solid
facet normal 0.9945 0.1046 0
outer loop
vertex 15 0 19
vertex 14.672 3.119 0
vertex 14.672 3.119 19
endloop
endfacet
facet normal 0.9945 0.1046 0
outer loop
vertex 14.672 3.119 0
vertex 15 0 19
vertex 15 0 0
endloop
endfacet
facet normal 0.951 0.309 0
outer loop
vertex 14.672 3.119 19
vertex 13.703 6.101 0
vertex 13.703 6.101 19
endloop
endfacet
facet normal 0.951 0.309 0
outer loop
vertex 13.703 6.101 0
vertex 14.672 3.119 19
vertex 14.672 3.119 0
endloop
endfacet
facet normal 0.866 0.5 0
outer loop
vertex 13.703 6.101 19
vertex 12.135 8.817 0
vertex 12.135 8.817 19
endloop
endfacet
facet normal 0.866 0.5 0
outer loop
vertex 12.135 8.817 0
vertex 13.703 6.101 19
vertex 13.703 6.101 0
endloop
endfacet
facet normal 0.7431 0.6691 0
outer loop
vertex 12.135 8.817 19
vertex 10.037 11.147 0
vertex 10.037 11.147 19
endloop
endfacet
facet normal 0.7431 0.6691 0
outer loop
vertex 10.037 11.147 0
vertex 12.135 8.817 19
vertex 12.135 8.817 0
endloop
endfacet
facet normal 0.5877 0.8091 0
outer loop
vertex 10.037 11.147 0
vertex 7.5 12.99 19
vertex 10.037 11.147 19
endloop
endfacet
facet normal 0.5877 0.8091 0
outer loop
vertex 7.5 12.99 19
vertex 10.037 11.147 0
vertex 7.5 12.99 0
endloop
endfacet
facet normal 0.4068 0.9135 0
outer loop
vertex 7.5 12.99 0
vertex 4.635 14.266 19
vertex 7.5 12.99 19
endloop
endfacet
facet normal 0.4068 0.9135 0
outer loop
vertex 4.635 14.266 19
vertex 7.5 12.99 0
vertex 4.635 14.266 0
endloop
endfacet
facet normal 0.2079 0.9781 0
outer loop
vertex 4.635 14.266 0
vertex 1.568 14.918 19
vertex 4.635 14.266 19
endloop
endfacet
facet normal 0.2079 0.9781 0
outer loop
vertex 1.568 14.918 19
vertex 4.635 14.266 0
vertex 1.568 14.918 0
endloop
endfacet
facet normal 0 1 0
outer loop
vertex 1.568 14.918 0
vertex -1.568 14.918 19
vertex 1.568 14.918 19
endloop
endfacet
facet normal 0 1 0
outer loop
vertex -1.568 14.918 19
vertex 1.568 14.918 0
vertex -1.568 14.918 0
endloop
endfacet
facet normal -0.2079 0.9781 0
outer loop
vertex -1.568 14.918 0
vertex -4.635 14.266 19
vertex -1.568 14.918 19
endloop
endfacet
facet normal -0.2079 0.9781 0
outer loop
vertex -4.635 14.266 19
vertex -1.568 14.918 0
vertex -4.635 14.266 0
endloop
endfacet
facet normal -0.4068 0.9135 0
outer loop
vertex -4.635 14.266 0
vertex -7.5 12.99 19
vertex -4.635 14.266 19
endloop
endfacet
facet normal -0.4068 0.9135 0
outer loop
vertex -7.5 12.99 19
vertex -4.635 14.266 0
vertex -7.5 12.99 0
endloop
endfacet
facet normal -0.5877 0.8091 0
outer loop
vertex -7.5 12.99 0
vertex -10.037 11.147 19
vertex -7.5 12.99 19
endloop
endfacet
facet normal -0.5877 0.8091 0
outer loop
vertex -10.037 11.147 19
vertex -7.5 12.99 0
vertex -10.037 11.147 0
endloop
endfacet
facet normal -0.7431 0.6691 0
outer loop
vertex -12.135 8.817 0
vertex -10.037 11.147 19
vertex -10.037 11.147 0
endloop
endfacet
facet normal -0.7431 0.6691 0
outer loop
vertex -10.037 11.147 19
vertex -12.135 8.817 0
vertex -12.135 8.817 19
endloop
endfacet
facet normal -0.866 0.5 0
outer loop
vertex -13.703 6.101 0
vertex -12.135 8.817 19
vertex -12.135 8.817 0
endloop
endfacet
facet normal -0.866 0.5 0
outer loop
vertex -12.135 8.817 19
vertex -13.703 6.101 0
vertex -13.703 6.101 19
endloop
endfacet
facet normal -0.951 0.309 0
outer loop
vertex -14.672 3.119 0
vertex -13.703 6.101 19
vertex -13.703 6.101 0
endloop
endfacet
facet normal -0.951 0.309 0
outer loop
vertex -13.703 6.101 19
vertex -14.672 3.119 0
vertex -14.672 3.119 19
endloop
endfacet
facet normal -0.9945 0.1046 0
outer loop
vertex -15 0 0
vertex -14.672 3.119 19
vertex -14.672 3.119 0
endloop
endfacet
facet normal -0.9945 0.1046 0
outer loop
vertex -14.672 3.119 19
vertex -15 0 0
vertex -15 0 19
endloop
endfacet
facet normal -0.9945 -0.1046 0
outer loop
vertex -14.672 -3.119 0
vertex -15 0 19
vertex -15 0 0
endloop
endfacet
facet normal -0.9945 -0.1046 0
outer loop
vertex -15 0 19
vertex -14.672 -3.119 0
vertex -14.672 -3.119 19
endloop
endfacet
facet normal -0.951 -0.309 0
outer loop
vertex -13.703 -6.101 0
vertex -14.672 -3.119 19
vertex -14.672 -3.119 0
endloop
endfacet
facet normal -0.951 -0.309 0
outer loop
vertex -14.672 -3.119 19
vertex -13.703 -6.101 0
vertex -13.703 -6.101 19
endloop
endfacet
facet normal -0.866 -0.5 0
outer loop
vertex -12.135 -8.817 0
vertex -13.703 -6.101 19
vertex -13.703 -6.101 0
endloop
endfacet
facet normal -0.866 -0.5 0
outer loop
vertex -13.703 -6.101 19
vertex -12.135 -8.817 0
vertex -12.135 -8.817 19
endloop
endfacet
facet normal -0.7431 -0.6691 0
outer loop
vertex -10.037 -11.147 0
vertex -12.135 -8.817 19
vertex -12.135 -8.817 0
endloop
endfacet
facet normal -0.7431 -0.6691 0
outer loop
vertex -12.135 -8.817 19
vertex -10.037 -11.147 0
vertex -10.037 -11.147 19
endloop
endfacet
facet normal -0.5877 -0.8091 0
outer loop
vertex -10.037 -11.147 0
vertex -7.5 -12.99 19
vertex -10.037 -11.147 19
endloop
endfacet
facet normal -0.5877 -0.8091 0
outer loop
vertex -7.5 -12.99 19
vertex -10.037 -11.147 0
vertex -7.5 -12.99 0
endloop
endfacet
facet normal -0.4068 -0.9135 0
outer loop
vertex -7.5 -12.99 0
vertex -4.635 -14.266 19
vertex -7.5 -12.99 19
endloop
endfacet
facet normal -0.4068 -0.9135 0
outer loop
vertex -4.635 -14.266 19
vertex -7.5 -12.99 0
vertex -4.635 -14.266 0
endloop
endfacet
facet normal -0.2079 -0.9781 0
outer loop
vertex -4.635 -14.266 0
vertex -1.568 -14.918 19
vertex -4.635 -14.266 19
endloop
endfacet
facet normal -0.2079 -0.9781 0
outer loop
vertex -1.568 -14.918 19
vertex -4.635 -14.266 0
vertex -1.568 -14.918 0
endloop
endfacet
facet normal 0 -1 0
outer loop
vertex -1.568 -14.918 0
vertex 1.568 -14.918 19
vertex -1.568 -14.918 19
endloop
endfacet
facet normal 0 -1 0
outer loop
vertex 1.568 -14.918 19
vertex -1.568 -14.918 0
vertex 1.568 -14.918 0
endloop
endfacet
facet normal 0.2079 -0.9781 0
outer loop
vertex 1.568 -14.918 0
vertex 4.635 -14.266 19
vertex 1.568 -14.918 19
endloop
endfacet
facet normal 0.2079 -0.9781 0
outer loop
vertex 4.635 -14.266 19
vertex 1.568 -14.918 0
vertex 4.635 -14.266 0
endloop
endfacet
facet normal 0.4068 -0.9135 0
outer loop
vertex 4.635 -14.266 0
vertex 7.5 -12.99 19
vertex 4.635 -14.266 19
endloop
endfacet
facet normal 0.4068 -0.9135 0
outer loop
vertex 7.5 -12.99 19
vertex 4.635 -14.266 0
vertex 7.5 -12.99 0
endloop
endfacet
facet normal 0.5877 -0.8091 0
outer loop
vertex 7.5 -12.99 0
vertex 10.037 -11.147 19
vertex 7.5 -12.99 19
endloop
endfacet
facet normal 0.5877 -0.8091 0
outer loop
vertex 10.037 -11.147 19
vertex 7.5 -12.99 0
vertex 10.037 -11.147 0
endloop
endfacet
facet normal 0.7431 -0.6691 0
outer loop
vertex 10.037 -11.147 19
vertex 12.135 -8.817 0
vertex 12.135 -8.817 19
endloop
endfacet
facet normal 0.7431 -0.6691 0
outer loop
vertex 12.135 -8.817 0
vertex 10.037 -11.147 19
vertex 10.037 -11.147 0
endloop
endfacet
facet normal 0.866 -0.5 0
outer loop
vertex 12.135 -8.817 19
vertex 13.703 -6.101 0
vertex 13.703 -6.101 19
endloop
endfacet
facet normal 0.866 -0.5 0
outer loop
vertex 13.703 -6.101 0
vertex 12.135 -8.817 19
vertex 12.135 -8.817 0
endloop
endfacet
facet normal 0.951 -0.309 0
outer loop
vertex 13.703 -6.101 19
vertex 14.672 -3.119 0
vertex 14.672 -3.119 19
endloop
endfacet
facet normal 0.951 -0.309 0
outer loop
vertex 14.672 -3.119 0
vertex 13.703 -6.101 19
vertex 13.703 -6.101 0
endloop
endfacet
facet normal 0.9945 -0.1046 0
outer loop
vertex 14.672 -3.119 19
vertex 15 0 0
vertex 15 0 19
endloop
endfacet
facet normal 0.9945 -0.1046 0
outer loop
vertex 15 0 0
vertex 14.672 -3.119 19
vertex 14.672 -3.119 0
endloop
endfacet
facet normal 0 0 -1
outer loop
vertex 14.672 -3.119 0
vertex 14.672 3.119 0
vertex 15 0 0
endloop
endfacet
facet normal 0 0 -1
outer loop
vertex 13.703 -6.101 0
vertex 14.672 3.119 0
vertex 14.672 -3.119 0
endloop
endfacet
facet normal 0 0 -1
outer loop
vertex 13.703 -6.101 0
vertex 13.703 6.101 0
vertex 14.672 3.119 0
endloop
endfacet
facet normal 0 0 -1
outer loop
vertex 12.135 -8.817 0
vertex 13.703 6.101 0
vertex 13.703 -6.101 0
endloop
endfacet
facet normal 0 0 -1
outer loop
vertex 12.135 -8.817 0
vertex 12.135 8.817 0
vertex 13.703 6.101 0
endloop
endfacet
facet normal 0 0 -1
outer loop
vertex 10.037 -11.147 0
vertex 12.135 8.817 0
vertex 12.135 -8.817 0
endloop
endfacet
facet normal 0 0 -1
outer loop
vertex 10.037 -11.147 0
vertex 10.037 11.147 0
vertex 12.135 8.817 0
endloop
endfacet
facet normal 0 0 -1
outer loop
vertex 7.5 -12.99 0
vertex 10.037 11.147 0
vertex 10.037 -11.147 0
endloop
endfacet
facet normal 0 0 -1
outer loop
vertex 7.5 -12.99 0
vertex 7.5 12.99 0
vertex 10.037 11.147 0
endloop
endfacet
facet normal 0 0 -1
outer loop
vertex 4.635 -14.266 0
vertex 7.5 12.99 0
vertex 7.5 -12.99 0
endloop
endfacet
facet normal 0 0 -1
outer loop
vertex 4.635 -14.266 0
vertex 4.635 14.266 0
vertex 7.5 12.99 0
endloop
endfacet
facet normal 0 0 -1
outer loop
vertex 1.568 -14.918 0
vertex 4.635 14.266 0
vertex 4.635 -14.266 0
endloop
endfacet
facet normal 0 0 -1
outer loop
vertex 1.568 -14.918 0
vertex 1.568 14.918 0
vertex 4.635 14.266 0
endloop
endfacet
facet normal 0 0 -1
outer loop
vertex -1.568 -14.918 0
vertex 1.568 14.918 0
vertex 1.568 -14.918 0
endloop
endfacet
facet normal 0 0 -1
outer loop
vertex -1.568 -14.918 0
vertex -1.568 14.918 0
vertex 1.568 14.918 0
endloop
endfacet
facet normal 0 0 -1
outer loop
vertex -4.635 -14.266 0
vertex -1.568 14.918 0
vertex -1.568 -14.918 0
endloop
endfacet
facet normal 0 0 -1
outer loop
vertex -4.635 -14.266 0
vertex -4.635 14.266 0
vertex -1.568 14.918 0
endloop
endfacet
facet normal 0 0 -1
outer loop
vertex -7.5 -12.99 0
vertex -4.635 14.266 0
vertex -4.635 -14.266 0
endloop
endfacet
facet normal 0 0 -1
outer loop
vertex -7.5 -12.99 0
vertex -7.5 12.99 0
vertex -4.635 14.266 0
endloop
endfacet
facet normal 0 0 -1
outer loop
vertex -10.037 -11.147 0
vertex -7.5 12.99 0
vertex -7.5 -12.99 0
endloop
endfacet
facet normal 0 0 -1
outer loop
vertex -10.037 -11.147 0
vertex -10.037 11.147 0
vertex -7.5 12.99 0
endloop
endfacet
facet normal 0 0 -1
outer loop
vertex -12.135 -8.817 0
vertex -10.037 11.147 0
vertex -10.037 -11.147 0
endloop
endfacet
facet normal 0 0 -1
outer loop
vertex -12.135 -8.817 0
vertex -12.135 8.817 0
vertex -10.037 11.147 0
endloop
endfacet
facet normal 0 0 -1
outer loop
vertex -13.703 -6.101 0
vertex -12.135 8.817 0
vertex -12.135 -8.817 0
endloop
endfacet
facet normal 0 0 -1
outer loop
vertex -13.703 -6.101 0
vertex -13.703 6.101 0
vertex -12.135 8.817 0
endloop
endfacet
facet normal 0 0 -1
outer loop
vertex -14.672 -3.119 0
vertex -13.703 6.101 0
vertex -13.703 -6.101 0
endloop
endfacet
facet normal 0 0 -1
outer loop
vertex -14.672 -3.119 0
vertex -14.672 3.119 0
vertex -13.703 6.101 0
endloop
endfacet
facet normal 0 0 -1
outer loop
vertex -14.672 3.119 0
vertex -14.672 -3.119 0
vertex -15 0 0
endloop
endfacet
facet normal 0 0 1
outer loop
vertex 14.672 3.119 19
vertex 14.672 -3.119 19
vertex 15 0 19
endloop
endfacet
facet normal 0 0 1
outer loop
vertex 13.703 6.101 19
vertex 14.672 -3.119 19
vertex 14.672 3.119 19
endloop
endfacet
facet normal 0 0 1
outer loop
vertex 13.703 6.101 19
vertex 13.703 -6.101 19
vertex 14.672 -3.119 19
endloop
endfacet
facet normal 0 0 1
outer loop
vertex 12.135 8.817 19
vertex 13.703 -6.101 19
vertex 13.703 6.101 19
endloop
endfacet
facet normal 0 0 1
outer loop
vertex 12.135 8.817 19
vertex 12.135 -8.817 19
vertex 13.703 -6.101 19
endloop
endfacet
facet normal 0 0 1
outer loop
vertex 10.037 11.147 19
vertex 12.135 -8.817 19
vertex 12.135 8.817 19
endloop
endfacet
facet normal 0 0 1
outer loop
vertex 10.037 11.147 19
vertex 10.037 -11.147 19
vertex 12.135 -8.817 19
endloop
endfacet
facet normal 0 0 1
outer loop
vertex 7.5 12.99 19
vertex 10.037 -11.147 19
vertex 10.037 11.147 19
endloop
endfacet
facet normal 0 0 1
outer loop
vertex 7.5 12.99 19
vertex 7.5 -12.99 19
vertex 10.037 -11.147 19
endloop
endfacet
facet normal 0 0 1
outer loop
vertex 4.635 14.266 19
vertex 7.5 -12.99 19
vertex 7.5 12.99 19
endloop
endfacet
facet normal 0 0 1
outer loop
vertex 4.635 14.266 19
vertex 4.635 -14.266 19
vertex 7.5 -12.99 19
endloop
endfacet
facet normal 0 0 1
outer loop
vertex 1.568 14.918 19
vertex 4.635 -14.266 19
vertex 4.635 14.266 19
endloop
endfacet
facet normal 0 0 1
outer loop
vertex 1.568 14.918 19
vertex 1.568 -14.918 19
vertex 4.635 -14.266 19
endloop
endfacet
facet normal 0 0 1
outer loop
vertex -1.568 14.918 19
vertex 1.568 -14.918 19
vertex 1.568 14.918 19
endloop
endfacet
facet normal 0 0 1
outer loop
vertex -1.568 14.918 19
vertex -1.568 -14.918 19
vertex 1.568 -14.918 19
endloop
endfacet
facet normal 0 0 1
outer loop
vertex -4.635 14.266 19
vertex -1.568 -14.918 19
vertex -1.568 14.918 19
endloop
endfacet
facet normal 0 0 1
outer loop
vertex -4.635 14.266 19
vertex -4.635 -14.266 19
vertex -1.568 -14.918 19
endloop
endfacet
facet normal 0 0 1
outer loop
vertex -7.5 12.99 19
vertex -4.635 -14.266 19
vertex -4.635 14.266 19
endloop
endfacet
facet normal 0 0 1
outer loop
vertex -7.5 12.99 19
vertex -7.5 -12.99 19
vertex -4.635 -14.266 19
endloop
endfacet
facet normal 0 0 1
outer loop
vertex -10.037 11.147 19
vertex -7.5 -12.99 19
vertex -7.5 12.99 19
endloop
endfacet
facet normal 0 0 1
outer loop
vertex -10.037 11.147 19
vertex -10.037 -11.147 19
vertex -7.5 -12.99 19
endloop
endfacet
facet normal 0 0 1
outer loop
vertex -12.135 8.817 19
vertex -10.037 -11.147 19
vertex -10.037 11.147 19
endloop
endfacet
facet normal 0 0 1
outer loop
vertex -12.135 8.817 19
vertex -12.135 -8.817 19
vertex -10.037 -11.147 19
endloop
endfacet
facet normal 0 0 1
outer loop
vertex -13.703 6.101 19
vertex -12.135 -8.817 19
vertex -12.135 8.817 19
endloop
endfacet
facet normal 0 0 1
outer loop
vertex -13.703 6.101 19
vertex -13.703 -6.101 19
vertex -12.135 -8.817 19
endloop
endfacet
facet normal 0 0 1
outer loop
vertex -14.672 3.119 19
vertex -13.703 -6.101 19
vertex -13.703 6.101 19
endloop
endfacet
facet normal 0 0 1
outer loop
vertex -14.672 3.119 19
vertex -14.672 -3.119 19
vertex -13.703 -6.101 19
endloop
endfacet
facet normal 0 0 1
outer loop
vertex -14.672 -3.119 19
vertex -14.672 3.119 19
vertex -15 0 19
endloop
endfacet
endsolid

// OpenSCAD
// Generated by SolidPython 1.0.1 on 2020-07-29 00:46:45


cylinder(h = 19, r1 = 15, r2 = 15);
/***********************************************
*********      SolidPython code:      **********
************************************************
 
# import packages: SolidPython
from solid import *
from solid.utils import *
from itertools import chain, combinations, permutations


class Resize:

    def __init__(self, scad_file):
        self.scad_file = scad_file
        #self.scad_file = import_scad(scad_file)
        # cone/cylinder param:
        self.r1 = 0
        self.r2 = 0
        self.h = 0
        # rectangular prism param:
        self.w = 0
        self.l = 0
        # ellipse param:
        self.r = 0

    # import OpenScad code (file name corresponds to shape)


    # classify shape + parameters
    def assign(self, param1, param2, param3):
        if self.scad_file == 'cone.scad':
            self.r1 = param1
            self.r2 = param2
            self.h = param3
        elif self.scad_file == 'cylinder.scad':
            self.r1 = param1
            self.r2 = param2
            self.h = param3
        elif self.scad_file == 'rectangularPrism.scad':
            self.h = param1
            self.l = param2
            self.w = param3
        else:
            self.r = param1
            self.h = param2

    # resize parameters
    def iterate(self):
        x = range(3, 20, 2)
        i = 1
        if self.scad_file == 'cone.scad':
            tempList = list(permutations(x, 2))
            for temp in tempList:
                param1 = temp[0]
                param2 = temp[1]
                filepath = 'produced_scad_files/' + 'cone' + str(param1) + '_' + str(param2) + '_' + '.scad'
                scad_render_to_file(cylinder(h=param1, r1=param2, r2=0), filepath)

        elif self.scad_file == 'cylinder.scad':
            tempList = list(permutations(x, 3))
            for temp in tempList:
                param1 = temp[0]
                param2 = temp[1]
                filepath = 'produced_scad_files/' + 'cylinder' + str(param1) + '_' + str(param2) + '_' + '.scad'
                scad_render_to_file(cylinder(h=param1, r1=param2, r2=param2), filepath)

        elif self.scad_file == 'rectangularPrism.scad':
            tempList = list(permutations(x, 3))
            for temp in tempList:
                param1 = temp[0]
                param2 = temp[1]
                param3 = temp[2]
                filepath = 'produced_scad_files/' + 'rectangularPrism' + str(param1) + '_' + str(param2) + '_' + str(
                    param3) + '.scad'
                scad_render_to_file(cube(size=(param1, param2, param3)), filepath)

        elif self.scad_file == 'ellipse.scad':
            tempList = list(permutations(x, 4))
            for temp in tempList:
                param1 = temp[0]
                param2 = temp[1]
                param3 = temp[2]
                param4 = temp[3]
                filepath = 'produced_scad_files/' + 'ellipse' + str(param1) + '_' + str(param2) + '_' + str(param3) + '_' + str(param4) + '.scad'
                scad_render_to_file(scale([param1, param2, param3])(sphere(r=param4)), filepath)

    def render_to_scadfile(self):
        scad_render_to_file(scad, 'example.scad') 
 
************************************************/
